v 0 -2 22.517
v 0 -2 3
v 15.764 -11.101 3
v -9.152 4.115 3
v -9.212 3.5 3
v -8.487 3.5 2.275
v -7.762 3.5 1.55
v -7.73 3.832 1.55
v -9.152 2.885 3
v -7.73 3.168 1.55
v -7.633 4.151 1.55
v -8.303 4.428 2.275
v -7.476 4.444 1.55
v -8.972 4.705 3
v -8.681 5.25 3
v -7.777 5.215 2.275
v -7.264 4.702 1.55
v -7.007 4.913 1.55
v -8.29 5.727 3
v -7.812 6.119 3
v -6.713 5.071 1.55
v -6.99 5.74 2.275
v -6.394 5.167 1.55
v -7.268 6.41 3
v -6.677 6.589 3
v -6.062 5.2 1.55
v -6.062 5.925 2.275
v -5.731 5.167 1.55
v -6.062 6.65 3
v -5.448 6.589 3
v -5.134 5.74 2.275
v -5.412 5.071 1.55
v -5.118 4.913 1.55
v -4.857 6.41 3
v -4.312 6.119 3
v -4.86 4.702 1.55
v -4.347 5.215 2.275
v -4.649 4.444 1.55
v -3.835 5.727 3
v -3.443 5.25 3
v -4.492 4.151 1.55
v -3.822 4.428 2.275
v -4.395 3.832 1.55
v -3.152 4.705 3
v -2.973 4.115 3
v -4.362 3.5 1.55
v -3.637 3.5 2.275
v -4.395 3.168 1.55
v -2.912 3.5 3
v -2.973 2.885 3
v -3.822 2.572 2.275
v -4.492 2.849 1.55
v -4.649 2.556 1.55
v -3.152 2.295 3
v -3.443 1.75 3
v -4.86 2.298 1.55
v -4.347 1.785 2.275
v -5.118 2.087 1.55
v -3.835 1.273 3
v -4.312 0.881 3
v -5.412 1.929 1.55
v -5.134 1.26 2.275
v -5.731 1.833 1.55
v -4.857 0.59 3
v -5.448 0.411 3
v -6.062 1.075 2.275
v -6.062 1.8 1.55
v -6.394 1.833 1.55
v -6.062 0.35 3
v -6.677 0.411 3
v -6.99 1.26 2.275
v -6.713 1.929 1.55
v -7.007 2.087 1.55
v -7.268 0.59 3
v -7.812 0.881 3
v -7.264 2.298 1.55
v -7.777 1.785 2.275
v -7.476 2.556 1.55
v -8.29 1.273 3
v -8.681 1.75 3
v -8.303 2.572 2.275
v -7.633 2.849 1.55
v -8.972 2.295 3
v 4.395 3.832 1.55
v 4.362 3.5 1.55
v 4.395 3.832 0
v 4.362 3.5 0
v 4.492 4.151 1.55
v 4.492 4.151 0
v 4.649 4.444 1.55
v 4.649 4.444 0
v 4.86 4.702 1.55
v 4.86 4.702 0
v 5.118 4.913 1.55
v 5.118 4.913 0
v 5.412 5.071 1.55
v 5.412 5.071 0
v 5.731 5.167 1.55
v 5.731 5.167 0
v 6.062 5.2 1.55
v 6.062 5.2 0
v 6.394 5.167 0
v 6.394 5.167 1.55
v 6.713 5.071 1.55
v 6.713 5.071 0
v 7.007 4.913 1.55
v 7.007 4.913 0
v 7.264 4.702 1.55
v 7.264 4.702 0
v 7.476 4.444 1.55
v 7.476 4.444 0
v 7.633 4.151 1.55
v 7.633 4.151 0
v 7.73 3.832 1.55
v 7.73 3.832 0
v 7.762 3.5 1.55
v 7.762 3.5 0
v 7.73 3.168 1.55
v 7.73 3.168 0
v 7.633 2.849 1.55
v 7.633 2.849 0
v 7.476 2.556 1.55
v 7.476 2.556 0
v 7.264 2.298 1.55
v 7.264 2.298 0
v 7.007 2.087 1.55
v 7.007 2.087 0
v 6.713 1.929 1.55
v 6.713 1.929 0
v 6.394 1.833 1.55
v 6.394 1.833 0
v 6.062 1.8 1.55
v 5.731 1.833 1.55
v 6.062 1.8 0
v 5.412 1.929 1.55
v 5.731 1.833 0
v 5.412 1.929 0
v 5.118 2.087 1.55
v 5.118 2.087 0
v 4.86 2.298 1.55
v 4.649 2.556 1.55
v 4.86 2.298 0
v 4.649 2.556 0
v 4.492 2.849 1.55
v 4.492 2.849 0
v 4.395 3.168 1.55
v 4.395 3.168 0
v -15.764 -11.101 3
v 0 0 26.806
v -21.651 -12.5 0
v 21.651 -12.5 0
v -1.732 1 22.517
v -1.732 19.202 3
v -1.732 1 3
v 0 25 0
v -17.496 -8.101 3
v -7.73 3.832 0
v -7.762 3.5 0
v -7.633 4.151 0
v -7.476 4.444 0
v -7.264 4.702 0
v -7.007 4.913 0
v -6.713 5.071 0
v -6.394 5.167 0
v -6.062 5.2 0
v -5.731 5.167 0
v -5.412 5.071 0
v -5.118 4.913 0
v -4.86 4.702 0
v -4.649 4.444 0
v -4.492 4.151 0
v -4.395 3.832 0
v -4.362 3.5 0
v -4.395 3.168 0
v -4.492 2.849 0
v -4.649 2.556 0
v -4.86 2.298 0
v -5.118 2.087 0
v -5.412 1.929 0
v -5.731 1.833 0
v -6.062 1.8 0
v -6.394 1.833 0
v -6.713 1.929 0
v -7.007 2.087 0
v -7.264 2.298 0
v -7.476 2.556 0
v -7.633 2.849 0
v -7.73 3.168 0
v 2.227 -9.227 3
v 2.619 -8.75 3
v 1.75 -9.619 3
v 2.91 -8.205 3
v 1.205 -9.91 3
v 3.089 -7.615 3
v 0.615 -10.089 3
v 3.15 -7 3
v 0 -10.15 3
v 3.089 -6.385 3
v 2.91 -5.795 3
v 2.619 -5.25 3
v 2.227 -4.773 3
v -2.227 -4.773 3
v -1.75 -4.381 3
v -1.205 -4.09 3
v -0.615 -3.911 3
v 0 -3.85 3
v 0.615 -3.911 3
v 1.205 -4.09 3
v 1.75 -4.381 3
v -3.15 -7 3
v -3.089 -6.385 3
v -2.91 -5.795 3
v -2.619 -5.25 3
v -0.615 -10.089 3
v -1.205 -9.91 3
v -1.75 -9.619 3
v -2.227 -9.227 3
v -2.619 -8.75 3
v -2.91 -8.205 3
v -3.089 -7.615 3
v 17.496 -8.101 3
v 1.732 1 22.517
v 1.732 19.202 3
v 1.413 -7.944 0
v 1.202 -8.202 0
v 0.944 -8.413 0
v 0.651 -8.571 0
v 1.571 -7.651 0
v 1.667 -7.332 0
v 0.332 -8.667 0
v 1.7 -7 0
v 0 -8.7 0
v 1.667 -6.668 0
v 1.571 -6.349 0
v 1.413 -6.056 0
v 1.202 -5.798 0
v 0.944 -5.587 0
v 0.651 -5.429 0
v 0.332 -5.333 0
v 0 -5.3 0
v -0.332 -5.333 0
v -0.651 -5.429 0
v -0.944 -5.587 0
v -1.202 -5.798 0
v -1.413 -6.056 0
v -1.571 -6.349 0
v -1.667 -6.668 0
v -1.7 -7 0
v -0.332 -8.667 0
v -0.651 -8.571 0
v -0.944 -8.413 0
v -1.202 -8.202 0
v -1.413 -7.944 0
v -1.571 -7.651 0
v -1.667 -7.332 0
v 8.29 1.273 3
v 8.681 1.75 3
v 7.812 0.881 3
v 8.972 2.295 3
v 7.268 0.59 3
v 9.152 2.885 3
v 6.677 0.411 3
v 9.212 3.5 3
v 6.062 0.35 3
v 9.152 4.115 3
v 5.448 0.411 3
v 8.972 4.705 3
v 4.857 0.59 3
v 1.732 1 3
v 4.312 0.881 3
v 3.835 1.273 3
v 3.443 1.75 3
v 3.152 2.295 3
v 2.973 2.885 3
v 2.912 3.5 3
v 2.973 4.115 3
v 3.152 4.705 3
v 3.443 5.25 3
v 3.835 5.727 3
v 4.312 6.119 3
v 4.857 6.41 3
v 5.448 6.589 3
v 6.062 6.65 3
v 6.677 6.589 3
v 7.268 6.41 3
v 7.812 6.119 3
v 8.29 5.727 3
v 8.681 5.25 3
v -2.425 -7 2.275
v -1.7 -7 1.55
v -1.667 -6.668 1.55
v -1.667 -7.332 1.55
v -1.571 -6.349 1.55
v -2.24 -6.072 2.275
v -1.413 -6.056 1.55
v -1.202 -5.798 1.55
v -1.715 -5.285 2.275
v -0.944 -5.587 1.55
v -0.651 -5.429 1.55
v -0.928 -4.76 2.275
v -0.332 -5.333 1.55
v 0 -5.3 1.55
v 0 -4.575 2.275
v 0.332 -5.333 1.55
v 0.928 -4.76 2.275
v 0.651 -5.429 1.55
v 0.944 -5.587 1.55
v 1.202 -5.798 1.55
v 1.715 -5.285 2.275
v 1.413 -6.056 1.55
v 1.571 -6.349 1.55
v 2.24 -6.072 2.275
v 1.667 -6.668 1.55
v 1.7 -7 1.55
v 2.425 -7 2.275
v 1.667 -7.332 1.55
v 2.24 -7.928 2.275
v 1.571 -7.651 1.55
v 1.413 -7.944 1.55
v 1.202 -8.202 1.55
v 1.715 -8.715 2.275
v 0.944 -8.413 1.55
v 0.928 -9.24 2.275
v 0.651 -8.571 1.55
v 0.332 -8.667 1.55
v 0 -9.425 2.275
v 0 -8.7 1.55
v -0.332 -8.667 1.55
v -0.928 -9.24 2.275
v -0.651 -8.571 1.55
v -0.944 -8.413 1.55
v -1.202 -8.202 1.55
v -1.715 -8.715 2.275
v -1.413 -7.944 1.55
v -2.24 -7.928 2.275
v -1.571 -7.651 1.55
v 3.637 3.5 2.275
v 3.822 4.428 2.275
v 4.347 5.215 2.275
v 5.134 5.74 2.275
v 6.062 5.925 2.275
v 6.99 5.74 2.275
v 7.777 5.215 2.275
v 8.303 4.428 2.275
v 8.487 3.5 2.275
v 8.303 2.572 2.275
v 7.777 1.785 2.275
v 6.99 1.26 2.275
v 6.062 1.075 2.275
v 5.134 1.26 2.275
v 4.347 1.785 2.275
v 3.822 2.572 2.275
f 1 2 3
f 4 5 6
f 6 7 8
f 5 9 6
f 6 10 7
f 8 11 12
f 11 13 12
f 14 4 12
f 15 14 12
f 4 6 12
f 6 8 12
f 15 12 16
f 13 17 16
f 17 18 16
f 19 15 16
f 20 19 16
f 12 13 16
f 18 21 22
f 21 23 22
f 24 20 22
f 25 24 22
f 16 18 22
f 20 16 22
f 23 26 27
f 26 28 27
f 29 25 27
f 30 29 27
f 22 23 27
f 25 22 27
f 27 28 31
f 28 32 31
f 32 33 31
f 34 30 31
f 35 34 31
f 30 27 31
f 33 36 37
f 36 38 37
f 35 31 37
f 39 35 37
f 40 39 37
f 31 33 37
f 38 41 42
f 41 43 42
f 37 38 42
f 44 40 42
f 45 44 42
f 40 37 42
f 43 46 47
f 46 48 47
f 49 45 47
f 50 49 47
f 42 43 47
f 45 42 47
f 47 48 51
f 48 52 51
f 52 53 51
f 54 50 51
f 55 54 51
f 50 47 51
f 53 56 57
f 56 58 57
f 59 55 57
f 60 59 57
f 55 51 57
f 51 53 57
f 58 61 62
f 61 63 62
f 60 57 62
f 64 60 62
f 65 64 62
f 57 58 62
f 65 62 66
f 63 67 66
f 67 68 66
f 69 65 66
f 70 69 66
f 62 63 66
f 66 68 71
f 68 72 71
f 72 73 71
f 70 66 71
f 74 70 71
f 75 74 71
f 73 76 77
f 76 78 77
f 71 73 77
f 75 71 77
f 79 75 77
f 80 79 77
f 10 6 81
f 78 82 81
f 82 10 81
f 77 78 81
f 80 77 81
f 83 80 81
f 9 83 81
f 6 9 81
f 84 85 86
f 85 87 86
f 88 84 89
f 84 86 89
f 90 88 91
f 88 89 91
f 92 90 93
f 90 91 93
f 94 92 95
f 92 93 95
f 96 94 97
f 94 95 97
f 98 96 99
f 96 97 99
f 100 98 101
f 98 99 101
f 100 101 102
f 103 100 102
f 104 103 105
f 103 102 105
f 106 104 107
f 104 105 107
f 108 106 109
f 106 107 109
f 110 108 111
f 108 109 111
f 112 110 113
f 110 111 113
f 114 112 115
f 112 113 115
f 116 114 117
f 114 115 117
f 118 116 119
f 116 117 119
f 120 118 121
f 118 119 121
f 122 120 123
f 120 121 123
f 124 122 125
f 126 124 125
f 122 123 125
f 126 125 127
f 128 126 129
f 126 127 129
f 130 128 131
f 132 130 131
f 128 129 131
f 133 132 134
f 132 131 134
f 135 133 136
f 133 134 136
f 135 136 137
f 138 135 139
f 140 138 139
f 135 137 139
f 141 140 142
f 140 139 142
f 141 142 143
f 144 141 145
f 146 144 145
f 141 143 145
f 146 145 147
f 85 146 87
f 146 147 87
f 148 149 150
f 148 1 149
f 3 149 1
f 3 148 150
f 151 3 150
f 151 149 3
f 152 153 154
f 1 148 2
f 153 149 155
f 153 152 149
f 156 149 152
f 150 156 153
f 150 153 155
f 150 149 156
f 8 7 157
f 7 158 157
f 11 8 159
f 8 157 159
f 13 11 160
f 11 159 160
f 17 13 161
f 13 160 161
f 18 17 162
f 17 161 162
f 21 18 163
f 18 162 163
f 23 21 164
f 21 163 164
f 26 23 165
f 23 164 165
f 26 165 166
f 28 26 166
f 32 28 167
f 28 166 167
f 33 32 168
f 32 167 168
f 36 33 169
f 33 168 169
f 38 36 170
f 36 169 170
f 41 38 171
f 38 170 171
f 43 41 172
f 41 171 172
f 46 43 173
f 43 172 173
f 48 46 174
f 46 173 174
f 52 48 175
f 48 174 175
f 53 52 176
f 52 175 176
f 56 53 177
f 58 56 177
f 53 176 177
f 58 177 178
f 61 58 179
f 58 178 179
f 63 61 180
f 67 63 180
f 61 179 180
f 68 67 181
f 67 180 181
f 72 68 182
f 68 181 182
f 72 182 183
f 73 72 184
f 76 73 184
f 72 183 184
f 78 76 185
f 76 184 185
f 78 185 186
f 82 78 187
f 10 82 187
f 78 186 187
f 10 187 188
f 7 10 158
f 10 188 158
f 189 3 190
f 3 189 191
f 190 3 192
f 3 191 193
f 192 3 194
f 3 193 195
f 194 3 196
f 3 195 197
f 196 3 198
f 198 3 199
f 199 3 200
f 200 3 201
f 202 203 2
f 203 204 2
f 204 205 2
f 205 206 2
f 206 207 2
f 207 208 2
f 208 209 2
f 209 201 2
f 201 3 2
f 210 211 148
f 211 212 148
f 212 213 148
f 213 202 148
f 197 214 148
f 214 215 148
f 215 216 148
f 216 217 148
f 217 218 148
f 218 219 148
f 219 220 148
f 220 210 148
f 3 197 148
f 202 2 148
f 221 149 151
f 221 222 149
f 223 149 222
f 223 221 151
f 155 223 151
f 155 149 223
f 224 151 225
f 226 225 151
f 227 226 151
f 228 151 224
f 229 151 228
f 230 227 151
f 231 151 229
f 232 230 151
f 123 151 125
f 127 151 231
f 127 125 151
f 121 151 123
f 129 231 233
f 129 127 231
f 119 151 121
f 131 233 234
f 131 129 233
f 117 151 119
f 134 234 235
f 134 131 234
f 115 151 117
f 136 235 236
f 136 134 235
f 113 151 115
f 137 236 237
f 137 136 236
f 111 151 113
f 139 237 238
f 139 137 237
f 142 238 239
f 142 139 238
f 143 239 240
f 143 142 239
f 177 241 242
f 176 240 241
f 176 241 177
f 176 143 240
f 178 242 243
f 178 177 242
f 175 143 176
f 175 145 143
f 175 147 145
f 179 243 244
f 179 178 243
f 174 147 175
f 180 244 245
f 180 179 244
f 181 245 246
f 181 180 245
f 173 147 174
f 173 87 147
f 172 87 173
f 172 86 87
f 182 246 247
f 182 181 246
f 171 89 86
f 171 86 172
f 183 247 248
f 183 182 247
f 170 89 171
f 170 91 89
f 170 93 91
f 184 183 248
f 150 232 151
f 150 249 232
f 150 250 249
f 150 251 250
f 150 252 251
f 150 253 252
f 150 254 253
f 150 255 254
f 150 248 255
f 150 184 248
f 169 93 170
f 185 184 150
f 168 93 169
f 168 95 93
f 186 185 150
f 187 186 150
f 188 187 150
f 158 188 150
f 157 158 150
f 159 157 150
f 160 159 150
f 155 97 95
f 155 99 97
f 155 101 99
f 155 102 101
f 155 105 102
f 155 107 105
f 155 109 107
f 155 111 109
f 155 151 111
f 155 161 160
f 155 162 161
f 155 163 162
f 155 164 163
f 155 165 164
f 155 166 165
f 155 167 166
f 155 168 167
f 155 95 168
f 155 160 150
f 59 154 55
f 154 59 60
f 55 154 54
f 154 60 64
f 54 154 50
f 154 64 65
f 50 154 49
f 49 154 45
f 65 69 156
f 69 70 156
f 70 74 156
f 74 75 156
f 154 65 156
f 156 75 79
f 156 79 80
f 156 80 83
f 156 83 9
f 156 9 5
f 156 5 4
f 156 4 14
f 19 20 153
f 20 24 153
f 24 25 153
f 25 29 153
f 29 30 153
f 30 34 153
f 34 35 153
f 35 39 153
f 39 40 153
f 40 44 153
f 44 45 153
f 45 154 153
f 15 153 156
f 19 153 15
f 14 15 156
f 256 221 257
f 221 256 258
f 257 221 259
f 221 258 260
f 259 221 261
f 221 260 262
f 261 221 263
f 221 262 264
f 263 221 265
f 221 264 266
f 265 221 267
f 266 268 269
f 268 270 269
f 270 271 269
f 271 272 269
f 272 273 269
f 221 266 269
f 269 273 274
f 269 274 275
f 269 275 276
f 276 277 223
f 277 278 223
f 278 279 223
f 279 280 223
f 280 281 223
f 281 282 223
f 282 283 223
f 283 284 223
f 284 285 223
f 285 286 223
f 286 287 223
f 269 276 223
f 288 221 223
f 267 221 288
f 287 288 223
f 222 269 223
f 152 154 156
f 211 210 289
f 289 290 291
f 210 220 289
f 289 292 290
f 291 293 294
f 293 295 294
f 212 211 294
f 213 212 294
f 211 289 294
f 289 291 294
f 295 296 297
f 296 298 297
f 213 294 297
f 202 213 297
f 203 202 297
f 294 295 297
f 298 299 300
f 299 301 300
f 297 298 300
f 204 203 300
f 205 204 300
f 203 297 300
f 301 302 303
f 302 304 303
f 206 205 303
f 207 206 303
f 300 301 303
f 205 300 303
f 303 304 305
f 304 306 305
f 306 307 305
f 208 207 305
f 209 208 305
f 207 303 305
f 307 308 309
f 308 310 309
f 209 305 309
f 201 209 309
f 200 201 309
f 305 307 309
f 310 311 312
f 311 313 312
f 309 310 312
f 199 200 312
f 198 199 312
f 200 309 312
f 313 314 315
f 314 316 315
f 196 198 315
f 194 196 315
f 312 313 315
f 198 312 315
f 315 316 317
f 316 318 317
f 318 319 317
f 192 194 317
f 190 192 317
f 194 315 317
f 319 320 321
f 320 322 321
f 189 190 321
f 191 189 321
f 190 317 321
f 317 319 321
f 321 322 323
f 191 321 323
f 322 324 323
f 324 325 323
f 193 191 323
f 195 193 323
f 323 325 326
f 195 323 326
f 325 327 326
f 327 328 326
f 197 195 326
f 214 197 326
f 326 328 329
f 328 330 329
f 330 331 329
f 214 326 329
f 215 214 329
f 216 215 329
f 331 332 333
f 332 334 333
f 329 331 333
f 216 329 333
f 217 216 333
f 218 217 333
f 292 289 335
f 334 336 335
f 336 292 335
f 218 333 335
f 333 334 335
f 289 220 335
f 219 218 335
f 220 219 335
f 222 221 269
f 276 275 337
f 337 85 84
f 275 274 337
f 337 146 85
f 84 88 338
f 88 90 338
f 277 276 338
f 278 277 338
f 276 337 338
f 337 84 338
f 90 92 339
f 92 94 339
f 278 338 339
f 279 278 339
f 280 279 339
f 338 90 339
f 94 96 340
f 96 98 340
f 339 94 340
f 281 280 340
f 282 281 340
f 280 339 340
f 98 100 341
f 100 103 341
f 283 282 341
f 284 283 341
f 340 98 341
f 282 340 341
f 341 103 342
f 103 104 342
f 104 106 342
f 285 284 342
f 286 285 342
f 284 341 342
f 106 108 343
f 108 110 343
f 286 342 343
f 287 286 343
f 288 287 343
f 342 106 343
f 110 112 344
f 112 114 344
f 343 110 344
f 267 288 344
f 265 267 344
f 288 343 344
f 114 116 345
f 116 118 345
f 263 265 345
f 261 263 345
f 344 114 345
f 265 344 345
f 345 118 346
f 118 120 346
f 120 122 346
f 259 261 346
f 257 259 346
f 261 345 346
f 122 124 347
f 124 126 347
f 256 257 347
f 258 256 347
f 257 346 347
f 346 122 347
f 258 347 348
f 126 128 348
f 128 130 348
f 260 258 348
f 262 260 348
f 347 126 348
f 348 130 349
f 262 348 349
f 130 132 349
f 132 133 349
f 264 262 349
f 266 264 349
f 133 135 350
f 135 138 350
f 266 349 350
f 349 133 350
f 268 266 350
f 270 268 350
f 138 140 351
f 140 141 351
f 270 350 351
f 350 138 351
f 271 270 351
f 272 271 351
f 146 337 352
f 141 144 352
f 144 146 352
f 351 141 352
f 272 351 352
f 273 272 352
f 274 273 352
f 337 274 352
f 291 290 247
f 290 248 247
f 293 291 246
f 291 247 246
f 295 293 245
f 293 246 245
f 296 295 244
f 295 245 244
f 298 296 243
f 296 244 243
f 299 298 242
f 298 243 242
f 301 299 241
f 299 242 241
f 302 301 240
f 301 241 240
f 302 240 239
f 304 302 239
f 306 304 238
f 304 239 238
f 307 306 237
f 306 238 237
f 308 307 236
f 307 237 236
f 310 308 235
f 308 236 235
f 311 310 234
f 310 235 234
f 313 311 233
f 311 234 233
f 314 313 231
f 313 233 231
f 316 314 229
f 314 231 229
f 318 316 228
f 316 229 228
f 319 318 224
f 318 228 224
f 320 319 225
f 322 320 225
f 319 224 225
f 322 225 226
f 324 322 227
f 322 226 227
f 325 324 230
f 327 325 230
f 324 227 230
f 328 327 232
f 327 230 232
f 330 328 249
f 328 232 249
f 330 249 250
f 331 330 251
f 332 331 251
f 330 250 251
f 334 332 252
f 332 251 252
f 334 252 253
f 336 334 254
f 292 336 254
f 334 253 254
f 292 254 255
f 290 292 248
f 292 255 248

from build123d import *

# Parameters (mm, degrees)
PAD_DEPTH          = 3
PAD001_DEPTH       = 30
POCKET_DEPTH       = 153.867368
POCKET_DEPTH_BACK  = 153.867368
POLARPATTERN_COUNT = 3
HOLE_D             = 3.4
HOLE_DEPTH         = 25
HOLE_CSINK_D       = 6.3
HOLE_CSINK_ANGLE   = 90


with BuildPart() as part:
    # Sketch → Pad (new body)
    with BuildSketch(Plane.XY):
        Polygon((0, 25), (21.650635, -12.5), (-21.650635, -12.5), align=None)
    extrude(amount=PAD_DEPTH)

    # Sketch001 (on Face5 of Pad) → Pad001 (join)
    with BuildSketch(Plane.XY.offset(3)):
        Polygon((-18.186533, -12.5), (0, -2), (18.186533, -12.5), (21.650635, -12.5), (19.918584, -9.5), (1.732051, 1), (1.732051, 22), (0, 25), (-1.732051, 22), (-1.732051, 1), (-19.918584, -9.5), (-21.650635, -12.5), align=None)
    extrude(amount=PAD001_DEPTH)

    # Sketch002 → Pocket (cut, two sides)
    with BuildSketch(Plane.YZ) as pocket_sk:
        Polygon((-12.5, 0), (-12.5, 45.815548), (8.864141, 45.815548), align=None)
    pocket = extrude(amount=-POCKET_DEPTH, mode=Mode.SUBTRACT) + extrude(pocket_sk.sketch, amount=POCKET_DEPTH_BACK, mode=Mode.SUBTRACT)

    # PolarPattern: Pocket ×3 about axis
    polarpattern_axis = Axis((0, 0, 0), (0, 0, 1))
    for i in range(1, POLARPATTERN_COUNT):
        add(pocket.rotate(polarpattern_axis, i * 360 / POLARPATTERN_COUNT), mode=Mode.SUBTRACT)

    # Hole
    with Locations(Plane.XY.offset(3)):
        with Locations((6.062178, 3.5), (0, -7), (-6.062178, 3.5)):
            CounterSinkHole(HOLE_D / 2, HOLE_CSINK_D / 2, depth=HOLE_DEPTH, counter_sink_angle=HOLE_CSINK_ANGLE)


solid = part.part
